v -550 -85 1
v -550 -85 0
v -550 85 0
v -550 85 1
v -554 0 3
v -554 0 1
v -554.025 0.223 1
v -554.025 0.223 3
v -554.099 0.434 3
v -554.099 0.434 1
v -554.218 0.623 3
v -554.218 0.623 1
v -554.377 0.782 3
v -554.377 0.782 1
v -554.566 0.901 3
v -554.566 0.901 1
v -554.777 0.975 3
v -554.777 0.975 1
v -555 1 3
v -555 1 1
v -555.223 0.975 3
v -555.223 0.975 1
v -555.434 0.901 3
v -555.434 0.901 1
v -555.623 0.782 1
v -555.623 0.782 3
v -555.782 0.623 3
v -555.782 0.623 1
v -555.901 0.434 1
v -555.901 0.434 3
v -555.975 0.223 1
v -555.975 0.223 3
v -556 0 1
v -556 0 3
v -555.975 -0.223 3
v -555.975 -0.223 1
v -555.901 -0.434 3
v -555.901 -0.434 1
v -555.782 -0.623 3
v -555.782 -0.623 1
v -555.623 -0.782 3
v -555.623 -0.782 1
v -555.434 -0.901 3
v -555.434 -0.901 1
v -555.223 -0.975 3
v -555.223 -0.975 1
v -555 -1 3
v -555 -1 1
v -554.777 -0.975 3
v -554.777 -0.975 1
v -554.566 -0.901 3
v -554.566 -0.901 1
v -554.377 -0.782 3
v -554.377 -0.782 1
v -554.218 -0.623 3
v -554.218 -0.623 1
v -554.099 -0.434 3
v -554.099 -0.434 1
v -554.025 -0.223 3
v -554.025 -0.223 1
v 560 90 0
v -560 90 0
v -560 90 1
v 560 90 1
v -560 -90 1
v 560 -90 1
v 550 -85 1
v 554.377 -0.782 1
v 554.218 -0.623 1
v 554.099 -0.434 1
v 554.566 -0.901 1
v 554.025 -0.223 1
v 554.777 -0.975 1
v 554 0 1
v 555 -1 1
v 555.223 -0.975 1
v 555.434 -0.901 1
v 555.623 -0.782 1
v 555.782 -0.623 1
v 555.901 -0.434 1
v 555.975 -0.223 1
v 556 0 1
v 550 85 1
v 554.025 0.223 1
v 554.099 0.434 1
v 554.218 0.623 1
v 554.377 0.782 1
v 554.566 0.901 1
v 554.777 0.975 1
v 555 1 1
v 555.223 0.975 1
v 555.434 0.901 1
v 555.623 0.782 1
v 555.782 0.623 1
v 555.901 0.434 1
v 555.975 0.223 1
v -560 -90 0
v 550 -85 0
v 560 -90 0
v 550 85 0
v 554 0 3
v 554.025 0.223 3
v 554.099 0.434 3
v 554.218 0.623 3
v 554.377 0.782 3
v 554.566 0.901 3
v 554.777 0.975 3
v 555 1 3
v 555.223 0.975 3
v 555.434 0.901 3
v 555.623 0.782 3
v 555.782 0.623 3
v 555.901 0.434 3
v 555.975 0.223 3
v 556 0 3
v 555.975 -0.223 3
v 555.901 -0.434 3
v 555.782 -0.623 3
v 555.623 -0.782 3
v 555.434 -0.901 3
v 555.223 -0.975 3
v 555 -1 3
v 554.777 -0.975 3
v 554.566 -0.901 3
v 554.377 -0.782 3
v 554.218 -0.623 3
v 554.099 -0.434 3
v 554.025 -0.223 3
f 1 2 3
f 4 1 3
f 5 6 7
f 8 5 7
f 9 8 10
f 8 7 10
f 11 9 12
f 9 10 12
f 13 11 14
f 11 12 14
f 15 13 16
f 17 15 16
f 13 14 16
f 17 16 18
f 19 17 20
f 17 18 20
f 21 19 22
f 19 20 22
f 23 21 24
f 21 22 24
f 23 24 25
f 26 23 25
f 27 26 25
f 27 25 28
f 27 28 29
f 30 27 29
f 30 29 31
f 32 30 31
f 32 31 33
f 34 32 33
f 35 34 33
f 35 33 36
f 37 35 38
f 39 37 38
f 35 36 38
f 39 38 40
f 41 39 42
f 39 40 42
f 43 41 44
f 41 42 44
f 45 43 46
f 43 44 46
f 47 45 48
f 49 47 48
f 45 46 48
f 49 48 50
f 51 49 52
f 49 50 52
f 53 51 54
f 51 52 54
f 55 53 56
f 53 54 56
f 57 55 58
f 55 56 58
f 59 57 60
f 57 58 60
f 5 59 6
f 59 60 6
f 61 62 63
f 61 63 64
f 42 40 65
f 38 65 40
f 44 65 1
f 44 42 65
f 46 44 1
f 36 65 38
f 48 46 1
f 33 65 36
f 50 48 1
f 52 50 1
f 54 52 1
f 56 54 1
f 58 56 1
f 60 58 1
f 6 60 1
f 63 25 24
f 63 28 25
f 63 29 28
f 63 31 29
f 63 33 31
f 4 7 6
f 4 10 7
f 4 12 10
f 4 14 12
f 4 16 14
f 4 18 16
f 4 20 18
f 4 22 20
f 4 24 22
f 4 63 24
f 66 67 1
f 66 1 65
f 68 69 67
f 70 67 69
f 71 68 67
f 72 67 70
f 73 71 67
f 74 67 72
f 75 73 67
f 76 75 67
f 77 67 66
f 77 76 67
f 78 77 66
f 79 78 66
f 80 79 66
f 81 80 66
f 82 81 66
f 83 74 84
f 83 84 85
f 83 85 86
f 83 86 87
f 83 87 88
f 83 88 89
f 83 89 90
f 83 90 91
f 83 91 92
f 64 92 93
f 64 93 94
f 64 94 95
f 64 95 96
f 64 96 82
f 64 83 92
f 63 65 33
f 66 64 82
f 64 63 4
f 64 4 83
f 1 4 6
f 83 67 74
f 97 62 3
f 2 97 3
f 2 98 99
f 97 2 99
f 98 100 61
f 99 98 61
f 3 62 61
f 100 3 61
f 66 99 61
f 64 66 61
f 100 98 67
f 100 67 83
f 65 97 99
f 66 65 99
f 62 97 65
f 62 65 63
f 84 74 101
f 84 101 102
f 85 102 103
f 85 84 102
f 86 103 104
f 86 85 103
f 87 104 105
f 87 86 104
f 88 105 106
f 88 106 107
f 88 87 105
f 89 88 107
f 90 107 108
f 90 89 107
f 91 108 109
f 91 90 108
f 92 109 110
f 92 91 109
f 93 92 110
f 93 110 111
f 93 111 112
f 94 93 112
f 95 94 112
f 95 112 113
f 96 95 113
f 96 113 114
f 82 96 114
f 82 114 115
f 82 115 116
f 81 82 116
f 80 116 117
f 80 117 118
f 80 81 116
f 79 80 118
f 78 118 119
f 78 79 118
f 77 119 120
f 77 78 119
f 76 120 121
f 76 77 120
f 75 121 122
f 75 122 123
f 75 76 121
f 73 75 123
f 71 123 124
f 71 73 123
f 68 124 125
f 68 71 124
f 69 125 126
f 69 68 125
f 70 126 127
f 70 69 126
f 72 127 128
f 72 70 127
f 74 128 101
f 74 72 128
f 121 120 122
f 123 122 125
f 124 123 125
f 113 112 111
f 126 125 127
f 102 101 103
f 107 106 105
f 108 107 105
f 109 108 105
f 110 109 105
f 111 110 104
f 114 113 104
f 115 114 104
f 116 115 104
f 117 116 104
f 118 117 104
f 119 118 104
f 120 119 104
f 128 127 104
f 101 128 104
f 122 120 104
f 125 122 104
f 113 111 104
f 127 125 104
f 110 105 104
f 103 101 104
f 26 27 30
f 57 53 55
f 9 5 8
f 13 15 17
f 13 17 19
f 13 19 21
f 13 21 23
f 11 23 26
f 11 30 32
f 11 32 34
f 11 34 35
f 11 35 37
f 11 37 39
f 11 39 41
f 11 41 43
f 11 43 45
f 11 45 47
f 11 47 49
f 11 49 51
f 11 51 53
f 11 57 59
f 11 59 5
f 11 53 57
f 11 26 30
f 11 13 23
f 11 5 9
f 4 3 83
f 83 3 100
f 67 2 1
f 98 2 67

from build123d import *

# Parameters (mm, degrees)
SKETCH1_W           = 1120
SKETCH1_H           = 180
SKETCH1_W_2         = 1100
SKETCH1_H_2         = 170
BOSS_EXTRUDE1_DEPTH = 1
SKETCH2_R           = 1
BOSS_EXTRUDE2_DEPTH = 2


with BuildPart() as part:
    # Sketch1 → Boss-Extrude1 (new body)
    with BuildSketch(Plane.XY):
        Rectangle(SKETCH1_W, SKETCH1_H)
        Rectangle(SKETCH1_W_2, SKETCH1_H_2, mode=Mode.SUBTRACT)
    extrude(amount=BOSS_EXTRUDE1_DEPTH)

    # Sketch2 → Boss-Extrude2 (add)
    with BuildSketch(Plane.XY.offset(1)):
        with Locations((-555, 0)):
            Circle(SKETCH2_R)
    boss_extrude2 = extrude(amount=BOSS_EXTRUDE2_DEPTH)

    # Mirror1: Boss-Extrude2 across plane
    add(boss_extrude2.mirror(Plane(origin=(0, 0, 0), x_dir=(0, 0, 1), z_dir=(1, 0, 0))))


solid = part.part
